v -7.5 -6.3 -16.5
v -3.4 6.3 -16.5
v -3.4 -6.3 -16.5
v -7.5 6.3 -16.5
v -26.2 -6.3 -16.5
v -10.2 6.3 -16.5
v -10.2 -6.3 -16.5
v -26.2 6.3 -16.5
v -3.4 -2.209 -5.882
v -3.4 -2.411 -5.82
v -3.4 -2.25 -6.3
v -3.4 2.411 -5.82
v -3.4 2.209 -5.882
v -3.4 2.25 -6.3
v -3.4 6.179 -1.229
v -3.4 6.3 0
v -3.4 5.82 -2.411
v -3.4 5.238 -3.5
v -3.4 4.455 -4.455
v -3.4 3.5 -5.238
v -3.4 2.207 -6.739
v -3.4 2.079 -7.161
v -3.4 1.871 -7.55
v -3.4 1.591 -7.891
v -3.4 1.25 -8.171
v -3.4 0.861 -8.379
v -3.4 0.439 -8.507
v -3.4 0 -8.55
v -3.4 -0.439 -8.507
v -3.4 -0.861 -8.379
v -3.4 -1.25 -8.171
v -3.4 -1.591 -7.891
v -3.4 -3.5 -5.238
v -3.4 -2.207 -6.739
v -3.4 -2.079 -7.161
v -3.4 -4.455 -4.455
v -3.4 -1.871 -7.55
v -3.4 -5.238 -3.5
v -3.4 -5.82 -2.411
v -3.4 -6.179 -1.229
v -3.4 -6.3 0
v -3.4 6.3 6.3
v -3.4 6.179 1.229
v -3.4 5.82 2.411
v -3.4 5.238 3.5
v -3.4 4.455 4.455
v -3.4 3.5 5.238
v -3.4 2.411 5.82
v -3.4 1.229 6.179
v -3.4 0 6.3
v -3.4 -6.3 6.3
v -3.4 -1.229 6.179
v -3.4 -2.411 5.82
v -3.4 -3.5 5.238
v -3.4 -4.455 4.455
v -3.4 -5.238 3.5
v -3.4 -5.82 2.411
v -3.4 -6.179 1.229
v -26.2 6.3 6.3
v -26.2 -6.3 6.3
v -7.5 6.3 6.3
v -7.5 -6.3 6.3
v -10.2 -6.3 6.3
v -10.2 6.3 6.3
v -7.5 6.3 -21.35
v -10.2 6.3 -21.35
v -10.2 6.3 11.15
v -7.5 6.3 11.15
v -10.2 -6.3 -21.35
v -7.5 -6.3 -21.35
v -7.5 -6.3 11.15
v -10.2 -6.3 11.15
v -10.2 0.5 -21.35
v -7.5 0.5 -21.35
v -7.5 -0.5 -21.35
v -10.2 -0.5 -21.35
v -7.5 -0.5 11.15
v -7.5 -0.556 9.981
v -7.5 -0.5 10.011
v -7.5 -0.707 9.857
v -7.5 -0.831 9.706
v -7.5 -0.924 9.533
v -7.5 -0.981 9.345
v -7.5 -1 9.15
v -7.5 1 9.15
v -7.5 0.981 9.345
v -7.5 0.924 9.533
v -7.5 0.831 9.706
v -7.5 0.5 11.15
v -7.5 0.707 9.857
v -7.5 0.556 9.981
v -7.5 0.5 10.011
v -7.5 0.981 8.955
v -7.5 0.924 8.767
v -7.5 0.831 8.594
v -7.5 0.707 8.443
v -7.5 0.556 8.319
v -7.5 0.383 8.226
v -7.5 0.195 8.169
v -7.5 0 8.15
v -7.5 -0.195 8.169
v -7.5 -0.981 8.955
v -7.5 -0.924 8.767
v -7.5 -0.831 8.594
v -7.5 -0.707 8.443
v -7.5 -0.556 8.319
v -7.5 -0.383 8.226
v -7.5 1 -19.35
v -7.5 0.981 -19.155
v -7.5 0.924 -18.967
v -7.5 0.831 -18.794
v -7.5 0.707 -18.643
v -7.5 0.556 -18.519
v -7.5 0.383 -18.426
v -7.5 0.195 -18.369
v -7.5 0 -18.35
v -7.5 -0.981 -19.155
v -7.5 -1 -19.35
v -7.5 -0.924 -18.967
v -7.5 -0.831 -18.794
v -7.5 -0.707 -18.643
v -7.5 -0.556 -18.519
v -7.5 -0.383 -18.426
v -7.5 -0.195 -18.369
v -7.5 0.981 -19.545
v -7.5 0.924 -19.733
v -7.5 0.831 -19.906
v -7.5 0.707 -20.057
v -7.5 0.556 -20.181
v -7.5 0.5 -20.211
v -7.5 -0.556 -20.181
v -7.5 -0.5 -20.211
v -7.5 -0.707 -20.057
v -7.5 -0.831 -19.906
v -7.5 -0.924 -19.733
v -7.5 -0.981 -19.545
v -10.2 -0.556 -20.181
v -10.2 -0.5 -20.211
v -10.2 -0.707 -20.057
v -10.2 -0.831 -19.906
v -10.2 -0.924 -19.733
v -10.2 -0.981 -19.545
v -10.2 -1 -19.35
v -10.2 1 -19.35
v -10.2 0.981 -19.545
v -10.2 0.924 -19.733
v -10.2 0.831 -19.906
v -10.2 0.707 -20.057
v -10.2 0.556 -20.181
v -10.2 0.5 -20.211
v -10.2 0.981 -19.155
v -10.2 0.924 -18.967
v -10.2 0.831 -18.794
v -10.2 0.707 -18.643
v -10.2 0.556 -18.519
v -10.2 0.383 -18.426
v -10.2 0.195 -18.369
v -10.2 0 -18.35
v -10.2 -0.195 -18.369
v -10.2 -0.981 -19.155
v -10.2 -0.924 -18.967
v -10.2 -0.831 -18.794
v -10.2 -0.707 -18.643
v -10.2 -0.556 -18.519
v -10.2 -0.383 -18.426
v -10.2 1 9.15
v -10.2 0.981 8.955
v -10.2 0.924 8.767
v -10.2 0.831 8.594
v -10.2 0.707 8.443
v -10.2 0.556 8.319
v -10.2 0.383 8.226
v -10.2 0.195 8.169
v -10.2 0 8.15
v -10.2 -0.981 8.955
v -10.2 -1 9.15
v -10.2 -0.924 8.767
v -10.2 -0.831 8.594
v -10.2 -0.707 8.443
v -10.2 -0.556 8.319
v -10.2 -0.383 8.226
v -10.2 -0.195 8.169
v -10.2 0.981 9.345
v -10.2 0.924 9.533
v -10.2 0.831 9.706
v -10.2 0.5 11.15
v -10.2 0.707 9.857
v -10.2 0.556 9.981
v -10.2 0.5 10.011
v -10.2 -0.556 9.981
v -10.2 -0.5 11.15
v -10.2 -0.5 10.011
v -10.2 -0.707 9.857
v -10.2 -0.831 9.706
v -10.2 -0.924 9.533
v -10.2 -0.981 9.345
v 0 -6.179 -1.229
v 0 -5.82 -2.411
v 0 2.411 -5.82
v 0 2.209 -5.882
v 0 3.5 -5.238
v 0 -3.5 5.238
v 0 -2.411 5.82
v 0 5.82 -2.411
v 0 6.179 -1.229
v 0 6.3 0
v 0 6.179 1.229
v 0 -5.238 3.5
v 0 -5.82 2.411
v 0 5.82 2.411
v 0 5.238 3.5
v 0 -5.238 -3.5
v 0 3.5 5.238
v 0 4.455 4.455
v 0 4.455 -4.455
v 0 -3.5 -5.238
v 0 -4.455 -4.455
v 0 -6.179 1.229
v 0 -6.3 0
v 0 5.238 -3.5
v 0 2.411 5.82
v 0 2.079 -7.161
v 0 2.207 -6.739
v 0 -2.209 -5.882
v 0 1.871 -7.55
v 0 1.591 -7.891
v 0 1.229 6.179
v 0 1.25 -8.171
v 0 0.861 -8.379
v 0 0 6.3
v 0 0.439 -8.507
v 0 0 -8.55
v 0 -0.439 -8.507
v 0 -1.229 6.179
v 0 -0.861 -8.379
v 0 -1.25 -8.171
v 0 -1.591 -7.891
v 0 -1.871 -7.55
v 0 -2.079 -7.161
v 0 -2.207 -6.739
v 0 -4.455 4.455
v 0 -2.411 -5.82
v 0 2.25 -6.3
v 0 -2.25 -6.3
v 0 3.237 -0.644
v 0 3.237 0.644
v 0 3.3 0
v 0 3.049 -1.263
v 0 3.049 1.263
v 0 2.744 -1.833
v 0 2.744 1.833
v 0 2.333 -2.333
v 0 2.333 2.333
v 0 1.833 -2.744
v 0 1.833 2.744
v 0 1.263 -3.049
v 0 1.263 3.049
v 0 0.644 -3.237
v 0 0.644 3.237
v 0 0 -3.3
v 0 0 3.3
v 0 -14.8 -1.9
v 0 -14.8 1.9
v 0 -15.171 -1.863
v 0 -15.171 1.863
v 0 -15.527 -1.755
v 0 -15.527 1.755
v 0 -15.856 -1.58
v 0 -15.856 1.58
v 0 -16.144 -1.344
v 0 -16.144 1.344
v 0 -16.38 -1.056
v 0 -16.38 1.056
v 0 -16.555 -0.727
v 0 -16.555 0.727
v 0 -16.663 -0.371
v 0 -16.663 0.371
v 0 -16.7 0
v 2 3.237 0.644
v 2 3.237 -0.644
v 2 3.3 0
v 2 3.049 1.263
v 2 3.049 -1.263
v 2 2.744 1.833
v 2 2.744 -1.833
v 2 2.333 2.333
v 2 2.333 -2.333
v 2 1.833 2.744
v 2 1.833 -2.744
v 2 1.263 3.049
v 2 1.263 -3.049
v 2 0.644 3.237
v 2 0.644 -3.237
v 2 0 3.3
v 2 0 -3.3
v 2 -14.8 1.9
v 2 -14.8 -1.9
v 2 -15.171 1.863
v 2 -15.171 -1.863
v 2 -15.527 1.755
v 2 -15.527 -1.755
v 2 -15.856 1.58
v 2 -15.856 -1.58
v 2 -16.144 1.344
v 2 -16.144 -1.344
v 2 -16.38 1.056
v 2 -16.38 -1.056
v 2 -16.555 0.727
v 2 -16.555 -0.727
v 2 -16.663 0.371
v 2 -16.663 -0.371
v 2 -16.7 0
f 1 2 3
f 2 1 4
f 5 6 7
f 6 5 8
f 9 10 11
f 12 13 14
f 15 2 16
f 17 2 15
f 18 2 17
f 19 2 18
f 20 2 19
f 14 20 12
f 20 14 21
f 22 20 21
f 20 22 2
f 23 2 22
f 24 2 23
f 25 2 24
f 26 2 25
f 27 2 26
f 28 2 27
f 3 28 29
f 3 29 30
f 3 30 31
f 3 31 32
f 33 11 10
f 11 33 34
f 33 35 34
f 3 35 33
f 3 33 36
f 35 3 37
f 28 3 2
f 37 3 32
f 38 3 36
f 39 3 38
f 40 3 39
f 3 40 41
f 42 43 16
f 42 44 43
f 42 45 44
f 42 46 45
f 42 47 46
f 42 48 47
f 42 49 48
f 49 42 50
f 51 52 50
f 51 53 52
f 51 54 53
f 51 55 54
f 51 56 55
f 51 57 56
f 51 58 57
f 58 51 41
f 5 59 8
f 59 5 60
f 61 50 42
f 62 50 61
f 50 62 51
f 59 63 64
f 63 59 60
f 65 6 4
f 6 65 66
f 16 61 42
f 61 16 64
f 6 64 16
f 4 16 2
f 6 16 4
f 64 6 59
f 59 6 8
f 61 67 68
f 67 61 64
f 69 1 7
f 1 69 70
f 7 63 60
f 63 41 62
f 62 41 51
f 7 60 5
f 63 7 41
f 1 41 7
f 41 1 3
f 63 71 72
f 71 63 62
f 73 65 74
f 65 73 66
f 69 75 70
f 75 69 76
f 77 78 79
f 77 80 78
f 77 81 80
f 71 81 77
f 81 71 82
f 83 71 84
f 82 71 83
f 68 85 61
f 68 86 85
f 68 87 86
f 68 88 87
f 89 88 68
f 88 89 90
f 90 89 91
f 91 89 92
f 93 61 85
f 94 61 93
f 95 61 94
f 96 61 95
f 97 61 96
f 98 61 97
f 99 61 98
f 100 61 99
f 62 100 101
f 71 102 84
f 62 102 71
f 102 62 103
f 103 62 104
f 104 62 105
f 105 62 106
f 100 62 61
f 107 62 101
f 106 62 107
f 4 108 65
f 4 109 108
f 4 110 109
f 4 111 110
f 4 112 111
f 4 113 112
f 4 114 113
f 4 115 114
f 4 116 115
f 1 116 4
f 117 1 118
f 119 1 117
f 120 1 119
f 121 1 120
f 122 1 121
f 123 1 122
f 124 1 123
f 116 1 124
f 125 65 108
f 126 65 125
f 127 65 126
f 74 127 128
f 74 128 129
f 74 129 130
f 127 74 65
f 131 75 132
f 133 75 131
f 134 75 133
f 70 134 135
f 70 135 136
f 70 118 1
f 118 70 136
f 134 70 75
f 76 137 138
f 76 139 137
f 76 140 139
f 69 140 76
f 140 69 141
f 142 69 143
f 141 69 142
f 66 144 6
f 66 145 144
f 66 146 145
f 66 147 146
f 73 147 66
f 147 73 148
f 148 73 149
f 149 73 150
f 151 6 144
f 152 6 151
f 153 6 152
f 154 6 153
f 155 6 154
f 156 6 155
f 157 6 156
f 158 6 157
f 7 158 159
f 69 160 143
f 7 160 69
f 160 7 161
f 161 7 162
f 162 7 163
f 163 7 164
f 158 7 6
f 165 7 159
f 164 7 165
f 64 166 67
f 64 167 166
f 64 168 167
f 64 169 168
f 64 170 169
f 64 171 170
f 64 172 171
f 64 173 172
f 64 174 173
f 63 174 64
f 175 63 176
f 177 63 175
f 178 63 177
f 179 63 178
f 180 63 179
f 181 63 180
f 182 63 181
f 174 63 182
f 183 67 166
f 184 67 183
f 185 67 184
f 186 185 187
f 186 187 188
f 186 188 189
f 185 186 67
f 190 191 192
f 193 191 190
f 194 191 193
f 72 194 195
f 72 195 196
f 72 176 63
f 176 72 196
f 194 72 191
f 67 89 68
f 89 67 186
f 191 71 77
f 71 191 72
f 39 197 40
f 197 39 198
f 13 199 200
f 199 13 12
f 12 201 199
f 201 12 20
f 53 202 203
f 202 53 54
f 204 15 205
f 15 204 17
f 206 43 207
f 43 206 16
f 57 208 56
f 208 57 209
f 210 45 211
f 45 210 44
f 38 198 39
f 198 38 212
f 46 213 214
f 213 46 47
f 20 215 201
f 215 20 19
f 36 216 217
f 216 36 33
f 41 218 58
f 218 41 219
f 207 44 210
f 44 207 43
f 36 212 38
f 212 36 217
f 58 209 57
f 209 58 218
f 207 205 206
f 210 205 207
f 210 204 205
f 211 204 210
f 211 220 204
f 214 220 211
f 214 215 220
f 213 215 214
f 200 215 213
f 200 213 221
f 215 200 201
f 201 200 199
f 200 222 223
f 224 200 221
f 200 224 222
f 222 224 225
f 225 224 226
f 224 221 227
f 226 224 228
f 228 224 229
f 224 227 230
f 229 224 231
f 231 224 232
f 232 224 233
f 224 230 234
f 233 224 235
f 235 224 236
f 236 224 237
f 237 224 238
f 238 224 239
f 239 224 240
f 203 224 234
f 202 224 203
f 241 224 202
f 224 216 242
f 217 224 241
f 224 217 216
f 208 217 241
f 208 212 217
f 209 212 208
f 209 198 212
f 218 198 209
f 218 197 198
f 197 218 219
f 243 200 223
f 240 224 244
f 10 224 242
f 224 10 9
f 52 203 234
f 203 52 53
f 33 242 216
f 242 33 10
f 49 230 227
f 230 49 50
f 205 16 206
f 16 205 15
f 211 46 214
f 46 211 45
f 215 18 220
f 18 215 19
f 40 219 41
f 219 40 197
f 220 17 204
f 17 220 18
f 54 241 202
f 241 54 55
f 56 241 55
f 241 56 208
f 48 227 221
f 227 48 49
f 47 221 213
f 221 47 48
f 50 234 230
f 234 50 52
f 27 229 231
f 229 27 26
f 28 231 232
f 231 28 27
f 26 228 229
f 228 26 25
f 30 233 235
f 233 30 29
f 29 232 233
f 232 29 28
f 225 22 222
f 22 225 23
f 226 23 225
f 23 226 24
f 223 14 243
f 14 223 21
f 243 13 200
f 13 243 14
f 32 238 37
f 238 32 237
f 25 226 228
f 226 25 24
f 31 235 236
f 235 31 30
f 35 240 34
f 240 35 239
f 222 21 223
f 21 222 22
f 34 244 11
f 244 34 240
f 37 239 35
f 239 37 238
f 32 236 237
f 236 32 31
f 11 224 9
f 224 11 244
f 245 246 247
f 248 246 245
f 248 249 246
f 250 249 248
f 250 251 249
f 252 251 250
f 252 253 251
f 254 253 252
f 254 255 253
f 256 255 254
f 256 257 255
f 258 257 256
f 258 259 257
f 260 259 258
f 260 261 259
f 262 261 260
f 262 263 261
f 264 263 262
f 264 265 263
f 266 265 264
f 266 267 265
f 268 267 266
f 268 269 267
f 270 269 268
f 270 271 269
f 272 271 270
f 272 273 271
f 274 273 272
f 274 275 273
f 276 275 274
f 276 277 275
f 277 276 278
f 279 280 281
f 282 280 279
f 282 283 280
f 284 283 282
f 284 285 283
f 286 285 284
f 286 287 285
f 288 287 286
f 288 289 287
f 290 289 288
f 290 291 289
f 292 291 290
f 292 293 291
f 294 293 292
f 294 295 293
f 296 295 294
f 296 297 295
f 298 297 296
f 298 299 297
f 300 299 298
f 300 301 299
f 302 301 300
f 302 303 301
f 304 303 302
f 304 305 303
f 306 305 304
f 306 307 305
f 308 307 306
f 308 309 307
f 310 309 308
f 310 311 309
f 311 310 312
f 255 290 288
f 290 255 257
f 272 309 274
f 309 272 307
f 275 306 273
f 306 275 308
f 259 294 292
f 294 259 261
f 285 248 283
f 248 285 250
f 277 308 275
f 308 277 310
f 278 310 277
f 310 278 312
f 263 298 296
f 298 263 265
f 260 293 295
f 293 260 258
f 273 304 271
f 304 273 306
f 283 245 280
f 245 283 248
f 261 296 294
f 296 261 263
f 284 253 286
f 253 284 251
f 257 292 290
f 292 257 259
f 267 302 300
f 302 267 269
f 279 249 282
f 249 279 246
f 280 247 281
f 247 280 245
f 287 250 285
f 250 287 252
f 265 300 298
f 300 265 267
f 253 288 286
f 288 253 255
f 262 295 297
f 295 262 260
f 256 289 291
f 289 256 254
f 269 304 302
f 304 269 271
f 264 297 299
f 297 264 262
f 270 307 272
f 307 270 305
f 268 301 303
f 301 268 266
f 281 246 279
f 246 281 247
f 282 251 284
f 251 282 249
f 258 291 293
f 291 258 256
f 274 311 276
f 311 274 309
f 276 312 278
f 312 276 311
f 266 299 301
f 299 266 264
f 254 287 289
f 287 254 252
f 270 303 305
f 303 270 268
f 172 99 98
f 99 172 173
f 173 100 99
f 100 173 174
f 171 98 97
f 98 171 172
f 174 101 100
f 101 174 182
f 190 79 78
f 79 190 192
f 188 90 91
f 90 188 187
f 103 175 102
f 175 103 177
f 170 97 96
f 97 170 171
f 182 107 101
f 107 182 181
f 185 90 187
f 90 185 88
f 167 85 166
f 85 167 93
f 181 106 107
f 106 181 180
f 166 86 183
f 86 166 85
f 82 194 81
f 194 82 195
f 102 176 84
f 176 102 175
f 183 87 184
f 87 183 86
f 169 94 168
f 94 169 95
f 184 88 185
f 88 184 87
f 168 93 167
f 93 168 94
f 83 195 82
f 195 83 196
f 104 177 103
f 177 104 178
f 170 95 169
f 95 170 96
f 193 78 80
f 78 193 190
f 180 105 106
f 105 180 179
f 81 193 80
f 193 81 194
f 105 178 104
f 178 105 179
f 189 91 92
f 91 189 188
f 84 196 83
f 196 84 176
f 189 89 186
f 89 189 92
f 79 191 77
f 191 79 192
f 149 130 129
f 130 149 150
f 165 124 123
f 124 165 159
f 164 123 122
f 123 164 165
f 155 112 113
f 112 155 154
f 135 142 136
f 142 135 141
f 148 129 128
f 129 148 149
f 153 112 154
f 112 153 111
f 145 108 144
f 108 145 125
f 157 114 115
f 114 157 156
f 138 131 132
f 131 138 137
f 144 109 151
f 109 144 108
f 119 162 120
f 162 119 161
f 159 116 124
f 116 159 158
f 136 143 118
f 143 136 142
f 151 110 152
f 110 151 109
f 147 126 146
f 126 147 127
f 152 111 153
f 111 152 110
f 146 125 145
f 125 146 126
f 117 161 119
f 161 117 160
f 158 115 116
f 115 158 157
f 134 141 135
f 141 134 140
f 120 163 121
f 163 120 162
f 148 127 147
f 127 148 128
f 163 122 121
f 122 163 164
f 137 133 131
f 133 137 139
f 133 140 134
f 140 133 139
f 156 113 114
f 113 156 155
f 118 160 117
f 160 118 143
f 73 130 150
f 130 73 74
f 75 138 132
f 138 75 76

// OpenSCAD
// servoSG90(fn) fn = è la definizione delle curve da usare nel render
//animazione abilitabile
module servo(fn,t) {
//    fn=32;
    L = 22.8;
    l = 12.6;
    h = 22.8;
    plateL = 32.5;
    plateH = 2.7;
    plateHPos = 16;
    topCylinderH = 3.4;
    smallTopCylinderD = 4.5;
    
    axisH = 2;
    axisD = 4;
    
    screwHoleCenter=2;
    screwHoleD=2;
    holeSize=1;
rotate([0,90,0]) translate ([-l/2,-l/2,-(h+topCylinderH)]) 
    difference() {
        union() {
            color("Blue", 0.7) {
                // main part
                cube([L, l, h]);
                // support
                translate([-(plateL - L) / 2, 0, plateHPos])    cube([plateL, l, plateH]);
                // top big cylinder
                translate([l/2,l/2,h])  cylinder(d=l, h=topCylinderH, $fn=fn);
                // top small cylinder
                translate([l, l/2, h])  cylinder(d=smallTopCylinderD, h=topCylinderH, $fn=fn);
            }
            color("white")  translate([l/2,l/2, h + topCylinderH]) {
                cylinder(d=axisD,h=axisH, $fn=fn);
                hull() {        // -------------------------------------- rimuovere da qui------------------------
                    cylinder(d=6.6,h=axisH, $fn=fn);
                    rotate([0,0,90+t*90])translate ([0,-20+(3.8+6.6)/2,0]) cylinder(d=3.8,h=axisH, $fn=fn); //translate va inserita la lunghezza del braccio
                }               // ---------------------------a qui per rimuovere il braccio del servo -----------
            }
        }
        color("grey", 0.7) {
            // screwHole -
            translate([-(plateL - L) / 2 + screwHoleCenter, l/2, plateHPos])    cylinder(d=screwHoleD, h=10, $fn=fn, center=true);
            translate([-(plateL - L) / 2 - 1, l / 2 - holeSize / 2, plateHPos - 1]) cube([3,holeSize,4]);
            // screwHole +
            translate([plateL - (plateL - L) / 2 - screwHoleCenter, l / 2, plateHPos - 1])  cylinder(d=screwHoleD, h=10, $fn=fn, center=true);
            translate([plateL- (plateL - L) / 2 - screwHoleCenter, l / 2 - holeSize / 2, plateHPos -1]) cube([3,holeSize,4]);
        }
    }
}

servo(32);
